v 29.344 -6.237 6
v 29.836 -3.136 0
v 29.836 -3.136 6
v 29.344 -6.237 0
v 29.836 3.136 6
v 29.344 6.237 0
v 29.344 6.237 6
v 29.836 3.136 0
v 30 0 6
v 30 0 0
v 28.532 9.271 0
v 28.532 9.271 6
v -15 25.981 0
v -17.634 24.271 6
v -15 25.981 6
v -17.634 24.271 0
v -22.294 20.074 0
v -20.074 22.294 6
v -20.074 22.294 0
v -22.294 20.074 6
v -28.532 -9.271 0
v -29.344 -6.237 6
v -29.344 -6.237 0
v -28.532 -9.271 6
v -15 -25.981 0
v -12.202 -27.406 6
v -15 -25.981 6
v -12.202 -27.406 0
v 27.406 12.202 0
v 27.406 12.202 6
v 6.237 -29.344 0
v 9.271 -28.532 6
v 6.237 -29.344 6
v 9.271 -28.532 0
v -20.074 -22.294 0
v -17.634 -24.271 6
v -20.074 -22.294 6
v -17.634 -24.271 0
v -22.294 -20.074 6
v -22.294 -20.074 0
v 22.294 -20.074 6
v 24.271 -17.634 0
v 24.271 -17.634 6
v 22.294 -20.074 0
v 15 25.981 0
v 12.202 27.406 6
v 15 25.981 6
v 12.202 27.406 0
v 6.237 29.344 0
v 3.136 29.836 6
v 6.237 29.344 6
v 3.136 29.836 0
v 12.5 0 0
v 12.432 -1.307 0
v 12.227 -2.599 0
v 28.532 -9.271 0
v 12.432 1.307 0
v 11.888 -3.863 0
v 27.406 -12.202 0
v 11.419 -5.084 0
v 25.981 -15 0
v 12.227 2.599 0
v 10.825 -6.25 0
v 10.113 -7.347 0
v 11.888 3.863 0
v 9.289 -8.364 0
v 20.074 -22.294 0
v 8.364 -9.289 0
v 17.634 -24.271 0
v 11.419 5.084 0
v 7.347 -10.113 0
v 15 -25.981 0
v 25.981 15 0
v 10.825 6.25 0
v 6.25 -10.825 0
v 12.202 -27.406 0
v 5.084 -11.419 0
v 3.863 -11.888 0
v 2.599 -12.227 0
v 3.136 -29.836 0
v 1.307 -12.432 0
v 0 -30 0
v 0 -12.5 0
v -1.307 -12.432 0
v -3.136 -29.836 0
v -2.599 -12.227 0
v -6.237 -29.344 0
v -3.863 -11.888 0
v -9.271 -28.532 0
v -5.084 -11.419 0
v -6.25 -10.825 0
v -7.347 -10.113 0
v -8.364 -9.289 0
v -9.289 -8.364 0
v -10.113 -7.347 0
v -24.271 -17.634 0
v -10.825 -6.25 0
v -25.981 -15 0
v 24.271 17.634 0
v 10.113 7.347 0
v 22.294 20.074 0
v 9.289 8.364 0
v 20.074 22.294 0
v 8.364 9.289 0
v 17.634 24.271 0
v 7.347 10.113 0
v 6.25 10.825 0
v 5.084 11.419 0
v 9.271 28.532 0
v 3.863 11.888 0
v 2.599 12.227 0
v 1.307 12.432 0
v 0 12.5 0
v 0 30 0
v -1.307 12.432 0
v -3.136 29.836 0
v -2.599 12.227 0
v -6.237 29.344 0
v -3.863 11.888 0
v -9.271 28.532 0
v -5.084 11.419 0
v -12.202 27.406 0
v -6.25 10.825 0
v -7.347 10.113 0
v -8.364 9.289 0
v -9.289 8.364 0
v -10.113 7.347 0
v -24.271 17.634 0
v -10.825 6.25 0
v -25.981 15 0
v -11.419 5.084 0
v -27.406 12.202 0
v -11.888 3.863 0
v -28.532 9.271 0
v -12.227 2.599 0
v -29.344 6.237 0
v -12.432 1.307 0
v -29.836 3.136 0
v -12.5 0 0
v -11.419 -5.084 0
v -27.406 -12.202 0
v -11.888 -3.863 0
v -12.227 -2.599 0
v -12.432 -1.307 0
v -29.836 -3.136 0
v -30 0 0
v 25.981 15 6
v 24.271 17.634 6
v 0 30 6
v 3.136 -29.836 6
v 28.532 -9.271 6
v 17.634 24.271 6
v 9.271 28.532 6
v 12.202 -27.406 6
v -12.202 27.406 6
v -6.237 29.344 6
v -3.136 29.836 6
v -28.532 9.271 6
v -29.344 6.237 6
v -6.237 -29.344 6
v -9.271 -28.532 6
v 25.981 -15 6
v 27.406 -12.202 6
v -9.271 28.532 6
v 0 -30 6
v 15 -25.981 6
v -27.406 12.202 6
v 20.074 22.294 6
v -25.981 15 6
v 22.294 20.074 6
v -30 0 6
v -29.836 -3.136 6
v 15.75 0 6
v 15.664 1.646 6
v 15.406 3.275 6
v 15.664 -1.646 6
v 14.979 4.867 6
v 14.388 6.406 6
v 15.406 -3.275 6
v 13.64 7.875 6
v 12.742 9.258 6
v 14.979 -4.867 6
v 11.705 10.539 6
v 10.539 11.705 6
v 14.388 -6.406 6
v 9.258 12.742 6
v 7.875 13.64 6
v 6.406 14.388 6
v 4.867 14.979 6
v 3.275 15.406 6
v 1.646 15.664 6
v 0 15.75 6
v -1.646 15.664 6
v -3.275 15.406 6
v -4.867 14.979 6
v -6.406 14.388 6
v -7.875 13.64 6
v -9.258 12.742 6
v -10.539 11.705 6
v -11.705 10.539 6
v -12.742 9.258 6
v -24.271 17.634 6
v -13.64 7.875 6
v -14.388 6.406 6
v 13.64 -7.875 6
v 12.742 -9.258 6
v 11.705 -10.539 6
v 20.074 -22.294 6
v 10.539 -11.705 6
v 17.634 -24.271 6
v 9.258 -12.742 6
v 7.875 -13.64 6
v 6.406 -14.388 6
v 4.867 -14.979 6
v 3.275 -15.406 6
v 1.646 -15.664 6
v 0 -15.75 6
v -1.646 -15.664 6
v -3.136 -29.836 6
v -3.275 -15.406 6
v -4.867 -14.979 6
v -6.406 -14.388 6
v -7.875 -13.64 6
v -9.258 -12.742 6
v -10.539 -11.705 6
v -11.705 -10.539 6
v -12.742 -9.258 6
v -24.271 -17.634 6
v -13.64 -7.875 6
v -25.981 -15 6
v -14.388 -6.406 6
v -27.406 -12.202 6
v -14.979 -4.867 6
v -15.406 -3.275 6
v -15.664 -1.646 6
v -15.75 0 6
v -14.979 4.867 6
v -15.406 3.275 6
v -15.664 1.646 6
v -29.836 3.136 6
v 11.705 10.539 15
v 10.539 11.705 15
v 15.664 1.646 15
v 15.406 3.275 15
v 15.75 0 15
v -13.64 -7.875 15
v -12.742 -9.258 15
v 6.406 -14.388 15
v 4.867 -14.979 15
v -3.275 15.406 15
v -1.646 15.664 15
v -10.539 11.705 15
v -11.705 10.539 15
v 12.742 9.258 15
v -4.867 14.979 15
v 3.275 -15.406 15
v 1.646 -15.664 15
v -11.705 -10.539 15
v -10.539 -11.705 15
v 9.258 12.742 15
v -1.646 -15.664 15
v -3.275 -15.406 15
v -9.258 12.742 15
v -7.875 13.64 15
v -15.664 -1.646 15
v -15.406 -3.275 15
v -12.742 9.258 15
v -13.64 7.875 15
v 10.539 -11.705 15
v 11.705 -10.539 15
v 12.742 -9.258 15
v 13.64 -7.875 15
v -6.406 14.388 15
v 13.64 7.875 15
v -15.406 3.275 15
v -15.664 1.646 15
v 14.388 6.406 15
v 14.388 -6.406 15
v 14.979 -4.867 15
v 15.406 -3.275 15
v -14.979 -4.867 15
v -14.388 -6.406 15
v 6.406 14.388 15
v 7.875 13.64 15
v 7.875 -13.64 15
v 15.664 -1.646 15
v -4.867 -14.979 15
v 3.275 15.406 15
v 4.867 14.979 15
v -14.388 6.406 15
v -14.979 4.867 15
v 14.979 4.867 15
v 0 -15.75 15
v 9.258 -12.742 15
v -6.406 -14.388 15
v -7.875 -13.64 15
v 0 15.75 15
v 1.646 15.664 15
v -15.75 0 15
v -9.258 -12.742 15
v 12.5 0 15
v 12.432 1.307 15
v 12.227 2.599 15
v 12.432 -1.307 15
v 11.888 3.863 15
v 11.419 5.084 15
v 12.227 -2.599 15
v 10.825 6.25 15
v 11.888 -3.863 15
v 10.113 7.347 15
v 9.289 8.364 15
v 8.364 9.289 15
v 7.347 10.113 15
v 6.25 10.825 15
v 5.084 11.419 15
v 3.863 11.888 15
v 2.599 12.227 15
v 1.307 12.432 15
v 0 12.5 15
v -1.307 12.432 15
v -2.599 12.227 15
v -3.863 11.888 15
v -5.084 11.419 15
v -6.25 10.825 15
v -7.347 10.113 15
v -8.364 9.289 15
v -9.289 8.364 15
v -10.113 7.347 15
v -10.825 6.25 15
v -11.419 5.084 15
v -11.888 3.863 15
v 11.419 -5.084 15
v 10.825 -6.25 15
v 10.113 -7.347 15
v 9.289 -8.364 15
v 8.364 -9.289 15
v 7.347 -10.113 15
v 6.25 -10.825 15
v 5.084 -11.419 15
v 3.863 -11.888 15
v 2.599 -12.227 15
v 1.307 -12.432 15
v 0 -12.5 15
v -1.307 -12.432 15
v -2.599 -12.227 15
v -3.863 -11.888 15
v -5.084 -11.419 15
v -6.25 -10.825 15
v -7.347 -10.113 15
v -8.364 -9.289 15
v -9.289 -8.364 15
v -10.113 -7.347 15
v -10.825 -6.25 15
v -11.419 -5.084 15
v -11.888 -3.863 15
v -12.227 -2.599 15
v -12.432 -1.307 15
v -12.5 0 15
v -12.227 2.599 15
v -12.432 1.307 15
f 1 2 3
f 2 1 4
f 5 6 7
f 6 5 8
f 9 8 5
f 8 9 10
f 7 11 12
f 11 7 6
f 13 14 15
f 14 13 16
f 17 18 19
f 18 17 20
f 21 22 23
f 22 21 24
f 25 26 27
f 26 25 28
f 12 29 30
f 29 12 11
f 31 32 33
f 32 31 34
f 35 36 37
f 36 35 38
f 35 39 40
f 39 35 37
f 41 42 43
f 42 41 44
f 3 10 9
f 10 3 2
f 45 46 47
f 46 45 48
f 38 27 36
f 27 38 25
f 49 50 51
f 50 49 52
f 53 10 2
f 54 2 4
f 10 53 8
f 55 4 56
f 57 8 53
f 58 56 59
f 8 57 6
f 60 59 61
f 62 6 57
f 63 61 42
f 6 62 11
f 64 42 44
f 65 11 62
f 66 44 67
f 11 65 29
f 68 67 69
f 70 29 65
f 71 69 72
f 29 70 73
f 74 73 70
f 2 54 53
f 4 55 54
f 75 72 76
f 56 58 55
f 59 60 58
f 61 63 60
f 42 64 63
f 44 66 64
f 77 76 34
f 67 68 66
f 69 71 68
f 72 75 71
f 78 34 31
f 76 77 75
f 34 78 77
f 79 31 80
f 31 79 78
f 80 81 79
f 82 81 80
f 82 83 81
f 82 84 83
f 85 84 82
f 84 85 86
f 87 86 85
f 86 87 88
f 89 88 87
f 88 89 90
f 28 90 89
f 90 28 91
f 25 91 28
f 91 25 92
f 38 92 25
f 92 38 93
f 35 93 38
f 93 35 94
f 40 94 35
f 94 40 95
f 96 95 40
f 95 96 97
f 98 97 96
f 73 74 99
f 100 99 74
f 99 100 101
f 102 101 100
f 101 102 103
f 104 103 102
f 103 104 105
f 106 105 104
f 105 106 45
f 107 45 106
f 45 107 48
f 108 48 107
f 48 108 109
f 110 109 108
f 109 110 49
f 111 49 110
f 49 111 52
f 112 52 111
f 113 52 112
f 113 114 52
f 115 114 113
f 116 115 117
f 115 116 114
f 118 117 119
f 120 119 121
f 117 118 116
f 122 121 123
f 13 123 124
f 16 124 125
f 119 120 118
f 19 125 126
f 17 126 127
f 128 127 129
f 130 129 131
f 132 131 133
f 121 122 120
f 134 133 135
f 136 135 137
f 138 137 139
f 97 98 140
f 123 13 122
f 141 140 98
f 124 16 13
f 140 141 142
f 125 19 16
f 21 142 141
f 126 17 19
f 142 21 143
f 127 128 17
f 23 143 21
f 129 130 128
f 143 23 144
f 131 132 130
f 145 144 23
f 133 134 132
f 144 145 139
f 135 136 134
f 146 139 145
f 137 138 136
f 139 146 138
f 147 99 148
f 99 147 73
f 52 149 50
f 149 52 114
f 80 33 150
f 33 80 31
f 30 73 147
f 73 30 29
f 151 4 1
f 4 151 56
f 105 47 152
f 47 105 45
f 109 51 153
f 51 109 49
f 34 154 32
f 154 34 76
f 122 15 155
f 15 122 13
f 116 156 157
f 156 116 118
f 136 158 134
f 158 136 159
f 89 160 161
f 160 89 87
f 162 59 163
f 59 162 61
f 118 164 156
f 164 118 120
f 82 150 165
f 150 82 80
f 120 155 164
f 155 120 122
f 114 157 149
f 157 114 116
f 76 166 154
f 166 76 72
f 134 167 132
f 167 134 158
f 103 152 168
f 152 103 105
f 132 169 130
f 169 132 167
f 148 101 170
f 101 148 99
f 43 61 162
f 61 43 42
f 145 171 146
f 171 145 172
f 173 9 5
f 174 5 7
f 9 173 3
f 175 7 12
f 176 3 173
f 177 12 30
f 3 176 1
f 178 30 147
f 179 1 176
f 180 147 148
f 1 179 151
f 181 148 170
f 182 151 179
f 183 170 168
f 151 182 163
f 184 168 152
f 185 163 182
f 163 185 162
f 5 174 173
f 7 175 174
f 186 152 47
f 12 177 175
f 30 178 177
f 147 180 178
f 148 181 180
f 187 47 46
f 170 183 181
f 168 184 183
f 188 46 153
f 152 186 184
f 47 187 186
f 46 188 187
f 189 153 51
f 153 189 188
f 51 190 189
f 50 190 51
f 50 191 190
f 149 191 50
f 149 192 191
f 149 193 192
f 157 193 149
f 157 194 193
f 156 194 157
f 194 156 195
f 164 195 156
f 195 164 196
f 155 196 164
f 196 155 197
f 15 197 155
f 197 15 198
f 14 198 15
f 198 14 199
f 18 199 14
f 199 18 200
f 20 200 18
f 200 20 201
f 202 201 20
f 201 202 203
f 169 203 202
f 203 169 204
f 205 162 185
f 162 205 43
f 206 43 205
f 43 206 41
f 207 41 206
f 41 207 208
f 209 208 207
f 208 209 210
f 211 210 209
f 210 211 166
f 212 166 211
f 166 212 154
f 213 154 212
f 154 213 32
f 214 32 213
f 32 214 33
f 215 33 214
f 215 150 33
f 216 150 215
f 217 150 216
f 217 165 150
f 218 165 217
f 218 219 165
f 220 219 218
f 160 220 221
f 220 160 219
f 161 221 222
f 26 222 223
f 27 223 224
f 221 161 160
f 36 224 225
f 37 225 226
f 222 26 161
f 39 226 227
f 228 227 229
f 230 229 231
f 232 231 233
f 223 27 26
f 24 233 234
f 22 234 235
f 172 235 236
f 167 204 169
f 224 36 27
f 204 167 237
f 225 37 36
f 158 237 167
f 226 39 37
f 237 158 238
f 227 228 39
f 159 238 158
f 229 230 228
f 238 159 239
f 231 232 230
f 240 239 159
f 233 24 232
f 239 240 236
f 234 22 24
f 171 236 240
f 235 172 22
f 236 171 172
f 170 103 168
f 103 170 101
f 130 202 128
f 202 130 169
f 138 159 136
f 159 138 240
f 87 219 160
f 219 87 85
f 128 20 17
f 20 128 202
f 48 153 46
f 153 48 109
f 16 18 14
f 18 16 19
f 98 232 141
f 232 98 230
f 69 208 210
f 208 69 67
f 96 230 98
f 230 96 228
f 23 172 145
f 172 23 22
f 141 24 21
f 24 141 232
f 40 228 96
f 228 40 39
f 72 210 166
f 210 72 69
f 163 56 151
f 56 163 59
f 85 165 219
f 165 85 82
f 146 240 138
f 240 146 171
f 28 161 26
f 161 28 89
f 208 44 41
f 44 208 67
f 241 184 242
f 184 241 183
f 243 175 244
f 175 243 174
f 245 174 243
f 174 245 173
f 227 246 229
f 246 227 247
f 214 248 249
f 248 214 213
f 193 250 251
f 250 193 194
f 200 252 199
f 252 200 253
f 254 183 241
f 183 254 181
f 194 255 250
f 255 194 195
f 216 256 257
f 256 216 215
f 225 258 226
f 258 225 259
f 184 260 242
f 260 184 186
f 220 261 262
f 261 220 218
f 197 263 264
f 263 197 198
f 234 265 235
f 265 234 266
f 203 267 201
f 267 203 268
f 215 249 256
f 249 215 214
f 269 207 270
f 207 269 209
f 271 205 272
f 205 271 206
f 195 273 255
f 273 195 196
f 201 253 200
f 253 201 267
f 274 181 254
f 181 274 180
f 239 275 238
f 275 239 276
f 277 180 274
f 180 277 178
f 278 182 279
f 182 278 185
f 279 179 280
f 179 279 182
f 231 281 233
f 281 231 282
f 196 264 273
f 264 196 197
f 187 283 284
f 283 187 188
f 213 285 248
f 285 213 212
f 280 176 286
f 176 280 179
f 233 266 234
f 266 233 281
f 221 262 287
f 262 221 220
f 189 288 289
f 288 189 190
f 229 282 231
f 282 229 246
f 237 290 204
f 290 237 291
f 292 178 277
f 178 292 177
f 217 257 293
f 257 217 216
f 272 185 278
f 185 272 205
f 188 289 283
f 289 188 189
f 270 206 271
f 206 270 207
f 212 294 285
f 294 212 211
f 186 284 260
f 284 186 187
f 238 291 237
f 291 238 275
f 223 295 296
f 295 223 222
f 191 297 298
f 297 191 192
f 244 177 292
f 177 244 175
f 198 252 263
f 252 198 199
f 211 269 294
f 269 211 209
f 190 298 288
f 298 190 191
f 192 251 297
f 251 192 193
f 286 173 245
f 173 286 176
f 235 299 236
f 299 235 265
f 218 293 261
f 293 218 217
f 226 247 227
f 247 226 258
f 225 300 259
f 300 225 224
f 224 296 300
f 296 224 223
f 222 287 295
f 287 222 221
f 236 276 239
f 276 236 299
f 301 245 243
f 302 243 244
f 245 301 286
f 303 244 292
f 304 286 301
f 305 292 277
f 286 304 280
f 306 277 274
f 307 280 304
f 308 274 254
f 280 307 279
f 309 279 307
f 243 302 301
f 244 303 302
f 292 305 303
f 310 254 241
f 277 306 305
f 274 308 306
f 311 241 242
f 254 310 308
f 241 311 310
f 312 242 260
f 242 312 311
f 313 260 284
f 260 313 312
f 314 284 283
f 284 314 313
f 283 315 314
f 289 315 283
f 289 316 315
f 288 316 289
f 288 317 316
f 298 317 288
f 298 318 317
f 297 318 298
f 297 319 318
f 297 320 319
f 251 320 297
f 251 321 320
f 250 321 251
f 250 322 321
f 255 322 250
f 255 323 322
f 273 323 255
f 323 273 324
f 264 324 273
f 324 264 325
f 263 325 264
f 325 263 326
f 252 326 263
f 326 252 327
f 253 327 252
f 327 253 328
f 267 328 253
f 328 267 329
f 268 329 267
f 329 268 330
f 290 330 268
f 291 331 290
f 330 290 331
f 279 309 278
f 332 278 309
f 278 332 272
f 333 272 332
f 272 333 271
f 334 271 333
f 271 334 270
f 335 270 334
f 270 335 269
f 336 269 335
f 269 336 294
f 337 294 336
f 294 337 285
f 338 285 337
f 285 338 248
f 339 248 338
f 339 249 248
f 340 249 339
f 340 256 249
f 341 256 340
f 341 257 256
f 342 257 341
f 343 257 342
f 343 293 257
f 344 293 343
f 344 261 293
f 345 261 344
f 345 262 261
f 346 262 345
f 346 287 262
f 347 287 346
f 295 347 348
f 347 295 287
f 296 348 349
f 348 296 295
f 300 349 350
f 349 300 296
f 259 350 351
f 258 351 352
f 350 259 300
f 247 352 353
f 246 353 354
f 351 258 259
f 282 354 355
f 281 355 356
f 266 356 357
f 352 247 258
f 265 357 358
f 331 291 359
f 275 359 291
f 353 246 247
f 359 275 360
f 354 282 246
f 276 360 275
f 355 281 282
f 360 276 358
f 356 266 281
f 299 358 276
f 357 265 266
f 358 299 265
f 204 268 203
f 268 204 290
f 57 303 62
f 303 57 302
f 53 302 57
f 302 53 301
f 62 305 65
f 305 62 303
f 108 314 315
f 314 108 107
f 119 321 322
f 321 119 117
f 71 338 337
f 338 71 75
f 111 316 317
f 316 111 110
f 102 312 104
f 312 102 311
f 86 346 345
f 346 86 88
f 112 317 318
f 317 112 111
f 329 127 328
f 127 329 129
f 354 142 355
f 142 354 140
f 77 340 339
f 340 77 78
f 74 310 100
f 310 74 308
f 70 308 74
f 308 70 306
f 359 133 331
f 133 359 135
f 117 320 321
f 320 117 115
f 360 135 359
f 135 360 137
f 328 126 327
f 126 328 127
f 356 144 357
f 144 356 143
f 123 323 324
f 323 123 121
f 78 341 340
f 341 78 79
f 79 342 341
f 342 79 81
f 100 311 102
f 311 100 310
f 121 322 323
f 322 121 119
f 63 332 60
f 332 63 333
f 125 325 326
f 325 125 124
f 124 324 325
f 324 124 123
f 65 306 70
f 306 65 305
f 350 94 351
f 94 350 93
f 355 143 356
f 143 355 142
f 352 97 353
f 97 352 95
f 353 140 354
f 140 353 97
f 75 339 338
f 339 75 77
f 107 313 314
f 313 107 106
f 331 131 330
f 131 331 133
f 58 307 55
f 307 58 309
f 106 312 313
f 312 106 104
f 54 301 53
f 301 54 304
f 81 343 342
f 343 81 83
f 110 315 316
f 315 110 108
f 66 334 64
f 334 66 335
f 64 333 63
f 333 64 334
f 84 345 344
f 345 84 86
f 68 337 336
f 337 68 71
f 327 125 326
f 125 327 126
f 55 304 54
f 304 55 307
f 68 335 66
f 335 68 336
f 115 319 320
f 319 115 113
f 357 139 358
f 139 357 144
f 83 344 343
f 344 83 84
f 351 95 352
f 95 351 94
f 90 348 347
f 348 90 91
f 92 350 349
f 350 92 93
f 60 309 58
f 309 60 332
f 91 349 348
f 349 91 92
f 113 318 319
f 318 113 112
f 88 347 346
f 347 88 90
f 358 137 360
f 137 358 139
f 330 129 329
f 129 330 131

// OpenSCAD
$fn=60;
//The inside hole size (diameter) of your filament spool in MM
spool_inside_diameter = 31.5; //min/step/max: [0:0.5:100]
//The total height of the spool adapter
total_height=15; //min/step/max: [0:0.5:100]
//The brim width -- how much lip to hold your spool
brim_width=60; //min/step/max: [0:0.5:100]
// the brim height -- how thick to the make the lip
brim_height=6; //min/step/max: [0:0.5:100]
//the size (diameter) of your HDD spindle / bearing -- what you mount the adapter to
spindle_size=25; //min/step/max: [0:0.5:100]

module main_spool() {
    union() {
        cylinder(r=brim_width/2, h=brim_height);
        cylinder(r=spool_inside_diameter/2, h=total_height);
    }
}

module hollow_center() {
    translate([0,0,-.5]) {
        cylinder(r=spindle_size/2, h=total_height+1);
    }
}

difference() {
    main_spool();
    hollow_center();
}
